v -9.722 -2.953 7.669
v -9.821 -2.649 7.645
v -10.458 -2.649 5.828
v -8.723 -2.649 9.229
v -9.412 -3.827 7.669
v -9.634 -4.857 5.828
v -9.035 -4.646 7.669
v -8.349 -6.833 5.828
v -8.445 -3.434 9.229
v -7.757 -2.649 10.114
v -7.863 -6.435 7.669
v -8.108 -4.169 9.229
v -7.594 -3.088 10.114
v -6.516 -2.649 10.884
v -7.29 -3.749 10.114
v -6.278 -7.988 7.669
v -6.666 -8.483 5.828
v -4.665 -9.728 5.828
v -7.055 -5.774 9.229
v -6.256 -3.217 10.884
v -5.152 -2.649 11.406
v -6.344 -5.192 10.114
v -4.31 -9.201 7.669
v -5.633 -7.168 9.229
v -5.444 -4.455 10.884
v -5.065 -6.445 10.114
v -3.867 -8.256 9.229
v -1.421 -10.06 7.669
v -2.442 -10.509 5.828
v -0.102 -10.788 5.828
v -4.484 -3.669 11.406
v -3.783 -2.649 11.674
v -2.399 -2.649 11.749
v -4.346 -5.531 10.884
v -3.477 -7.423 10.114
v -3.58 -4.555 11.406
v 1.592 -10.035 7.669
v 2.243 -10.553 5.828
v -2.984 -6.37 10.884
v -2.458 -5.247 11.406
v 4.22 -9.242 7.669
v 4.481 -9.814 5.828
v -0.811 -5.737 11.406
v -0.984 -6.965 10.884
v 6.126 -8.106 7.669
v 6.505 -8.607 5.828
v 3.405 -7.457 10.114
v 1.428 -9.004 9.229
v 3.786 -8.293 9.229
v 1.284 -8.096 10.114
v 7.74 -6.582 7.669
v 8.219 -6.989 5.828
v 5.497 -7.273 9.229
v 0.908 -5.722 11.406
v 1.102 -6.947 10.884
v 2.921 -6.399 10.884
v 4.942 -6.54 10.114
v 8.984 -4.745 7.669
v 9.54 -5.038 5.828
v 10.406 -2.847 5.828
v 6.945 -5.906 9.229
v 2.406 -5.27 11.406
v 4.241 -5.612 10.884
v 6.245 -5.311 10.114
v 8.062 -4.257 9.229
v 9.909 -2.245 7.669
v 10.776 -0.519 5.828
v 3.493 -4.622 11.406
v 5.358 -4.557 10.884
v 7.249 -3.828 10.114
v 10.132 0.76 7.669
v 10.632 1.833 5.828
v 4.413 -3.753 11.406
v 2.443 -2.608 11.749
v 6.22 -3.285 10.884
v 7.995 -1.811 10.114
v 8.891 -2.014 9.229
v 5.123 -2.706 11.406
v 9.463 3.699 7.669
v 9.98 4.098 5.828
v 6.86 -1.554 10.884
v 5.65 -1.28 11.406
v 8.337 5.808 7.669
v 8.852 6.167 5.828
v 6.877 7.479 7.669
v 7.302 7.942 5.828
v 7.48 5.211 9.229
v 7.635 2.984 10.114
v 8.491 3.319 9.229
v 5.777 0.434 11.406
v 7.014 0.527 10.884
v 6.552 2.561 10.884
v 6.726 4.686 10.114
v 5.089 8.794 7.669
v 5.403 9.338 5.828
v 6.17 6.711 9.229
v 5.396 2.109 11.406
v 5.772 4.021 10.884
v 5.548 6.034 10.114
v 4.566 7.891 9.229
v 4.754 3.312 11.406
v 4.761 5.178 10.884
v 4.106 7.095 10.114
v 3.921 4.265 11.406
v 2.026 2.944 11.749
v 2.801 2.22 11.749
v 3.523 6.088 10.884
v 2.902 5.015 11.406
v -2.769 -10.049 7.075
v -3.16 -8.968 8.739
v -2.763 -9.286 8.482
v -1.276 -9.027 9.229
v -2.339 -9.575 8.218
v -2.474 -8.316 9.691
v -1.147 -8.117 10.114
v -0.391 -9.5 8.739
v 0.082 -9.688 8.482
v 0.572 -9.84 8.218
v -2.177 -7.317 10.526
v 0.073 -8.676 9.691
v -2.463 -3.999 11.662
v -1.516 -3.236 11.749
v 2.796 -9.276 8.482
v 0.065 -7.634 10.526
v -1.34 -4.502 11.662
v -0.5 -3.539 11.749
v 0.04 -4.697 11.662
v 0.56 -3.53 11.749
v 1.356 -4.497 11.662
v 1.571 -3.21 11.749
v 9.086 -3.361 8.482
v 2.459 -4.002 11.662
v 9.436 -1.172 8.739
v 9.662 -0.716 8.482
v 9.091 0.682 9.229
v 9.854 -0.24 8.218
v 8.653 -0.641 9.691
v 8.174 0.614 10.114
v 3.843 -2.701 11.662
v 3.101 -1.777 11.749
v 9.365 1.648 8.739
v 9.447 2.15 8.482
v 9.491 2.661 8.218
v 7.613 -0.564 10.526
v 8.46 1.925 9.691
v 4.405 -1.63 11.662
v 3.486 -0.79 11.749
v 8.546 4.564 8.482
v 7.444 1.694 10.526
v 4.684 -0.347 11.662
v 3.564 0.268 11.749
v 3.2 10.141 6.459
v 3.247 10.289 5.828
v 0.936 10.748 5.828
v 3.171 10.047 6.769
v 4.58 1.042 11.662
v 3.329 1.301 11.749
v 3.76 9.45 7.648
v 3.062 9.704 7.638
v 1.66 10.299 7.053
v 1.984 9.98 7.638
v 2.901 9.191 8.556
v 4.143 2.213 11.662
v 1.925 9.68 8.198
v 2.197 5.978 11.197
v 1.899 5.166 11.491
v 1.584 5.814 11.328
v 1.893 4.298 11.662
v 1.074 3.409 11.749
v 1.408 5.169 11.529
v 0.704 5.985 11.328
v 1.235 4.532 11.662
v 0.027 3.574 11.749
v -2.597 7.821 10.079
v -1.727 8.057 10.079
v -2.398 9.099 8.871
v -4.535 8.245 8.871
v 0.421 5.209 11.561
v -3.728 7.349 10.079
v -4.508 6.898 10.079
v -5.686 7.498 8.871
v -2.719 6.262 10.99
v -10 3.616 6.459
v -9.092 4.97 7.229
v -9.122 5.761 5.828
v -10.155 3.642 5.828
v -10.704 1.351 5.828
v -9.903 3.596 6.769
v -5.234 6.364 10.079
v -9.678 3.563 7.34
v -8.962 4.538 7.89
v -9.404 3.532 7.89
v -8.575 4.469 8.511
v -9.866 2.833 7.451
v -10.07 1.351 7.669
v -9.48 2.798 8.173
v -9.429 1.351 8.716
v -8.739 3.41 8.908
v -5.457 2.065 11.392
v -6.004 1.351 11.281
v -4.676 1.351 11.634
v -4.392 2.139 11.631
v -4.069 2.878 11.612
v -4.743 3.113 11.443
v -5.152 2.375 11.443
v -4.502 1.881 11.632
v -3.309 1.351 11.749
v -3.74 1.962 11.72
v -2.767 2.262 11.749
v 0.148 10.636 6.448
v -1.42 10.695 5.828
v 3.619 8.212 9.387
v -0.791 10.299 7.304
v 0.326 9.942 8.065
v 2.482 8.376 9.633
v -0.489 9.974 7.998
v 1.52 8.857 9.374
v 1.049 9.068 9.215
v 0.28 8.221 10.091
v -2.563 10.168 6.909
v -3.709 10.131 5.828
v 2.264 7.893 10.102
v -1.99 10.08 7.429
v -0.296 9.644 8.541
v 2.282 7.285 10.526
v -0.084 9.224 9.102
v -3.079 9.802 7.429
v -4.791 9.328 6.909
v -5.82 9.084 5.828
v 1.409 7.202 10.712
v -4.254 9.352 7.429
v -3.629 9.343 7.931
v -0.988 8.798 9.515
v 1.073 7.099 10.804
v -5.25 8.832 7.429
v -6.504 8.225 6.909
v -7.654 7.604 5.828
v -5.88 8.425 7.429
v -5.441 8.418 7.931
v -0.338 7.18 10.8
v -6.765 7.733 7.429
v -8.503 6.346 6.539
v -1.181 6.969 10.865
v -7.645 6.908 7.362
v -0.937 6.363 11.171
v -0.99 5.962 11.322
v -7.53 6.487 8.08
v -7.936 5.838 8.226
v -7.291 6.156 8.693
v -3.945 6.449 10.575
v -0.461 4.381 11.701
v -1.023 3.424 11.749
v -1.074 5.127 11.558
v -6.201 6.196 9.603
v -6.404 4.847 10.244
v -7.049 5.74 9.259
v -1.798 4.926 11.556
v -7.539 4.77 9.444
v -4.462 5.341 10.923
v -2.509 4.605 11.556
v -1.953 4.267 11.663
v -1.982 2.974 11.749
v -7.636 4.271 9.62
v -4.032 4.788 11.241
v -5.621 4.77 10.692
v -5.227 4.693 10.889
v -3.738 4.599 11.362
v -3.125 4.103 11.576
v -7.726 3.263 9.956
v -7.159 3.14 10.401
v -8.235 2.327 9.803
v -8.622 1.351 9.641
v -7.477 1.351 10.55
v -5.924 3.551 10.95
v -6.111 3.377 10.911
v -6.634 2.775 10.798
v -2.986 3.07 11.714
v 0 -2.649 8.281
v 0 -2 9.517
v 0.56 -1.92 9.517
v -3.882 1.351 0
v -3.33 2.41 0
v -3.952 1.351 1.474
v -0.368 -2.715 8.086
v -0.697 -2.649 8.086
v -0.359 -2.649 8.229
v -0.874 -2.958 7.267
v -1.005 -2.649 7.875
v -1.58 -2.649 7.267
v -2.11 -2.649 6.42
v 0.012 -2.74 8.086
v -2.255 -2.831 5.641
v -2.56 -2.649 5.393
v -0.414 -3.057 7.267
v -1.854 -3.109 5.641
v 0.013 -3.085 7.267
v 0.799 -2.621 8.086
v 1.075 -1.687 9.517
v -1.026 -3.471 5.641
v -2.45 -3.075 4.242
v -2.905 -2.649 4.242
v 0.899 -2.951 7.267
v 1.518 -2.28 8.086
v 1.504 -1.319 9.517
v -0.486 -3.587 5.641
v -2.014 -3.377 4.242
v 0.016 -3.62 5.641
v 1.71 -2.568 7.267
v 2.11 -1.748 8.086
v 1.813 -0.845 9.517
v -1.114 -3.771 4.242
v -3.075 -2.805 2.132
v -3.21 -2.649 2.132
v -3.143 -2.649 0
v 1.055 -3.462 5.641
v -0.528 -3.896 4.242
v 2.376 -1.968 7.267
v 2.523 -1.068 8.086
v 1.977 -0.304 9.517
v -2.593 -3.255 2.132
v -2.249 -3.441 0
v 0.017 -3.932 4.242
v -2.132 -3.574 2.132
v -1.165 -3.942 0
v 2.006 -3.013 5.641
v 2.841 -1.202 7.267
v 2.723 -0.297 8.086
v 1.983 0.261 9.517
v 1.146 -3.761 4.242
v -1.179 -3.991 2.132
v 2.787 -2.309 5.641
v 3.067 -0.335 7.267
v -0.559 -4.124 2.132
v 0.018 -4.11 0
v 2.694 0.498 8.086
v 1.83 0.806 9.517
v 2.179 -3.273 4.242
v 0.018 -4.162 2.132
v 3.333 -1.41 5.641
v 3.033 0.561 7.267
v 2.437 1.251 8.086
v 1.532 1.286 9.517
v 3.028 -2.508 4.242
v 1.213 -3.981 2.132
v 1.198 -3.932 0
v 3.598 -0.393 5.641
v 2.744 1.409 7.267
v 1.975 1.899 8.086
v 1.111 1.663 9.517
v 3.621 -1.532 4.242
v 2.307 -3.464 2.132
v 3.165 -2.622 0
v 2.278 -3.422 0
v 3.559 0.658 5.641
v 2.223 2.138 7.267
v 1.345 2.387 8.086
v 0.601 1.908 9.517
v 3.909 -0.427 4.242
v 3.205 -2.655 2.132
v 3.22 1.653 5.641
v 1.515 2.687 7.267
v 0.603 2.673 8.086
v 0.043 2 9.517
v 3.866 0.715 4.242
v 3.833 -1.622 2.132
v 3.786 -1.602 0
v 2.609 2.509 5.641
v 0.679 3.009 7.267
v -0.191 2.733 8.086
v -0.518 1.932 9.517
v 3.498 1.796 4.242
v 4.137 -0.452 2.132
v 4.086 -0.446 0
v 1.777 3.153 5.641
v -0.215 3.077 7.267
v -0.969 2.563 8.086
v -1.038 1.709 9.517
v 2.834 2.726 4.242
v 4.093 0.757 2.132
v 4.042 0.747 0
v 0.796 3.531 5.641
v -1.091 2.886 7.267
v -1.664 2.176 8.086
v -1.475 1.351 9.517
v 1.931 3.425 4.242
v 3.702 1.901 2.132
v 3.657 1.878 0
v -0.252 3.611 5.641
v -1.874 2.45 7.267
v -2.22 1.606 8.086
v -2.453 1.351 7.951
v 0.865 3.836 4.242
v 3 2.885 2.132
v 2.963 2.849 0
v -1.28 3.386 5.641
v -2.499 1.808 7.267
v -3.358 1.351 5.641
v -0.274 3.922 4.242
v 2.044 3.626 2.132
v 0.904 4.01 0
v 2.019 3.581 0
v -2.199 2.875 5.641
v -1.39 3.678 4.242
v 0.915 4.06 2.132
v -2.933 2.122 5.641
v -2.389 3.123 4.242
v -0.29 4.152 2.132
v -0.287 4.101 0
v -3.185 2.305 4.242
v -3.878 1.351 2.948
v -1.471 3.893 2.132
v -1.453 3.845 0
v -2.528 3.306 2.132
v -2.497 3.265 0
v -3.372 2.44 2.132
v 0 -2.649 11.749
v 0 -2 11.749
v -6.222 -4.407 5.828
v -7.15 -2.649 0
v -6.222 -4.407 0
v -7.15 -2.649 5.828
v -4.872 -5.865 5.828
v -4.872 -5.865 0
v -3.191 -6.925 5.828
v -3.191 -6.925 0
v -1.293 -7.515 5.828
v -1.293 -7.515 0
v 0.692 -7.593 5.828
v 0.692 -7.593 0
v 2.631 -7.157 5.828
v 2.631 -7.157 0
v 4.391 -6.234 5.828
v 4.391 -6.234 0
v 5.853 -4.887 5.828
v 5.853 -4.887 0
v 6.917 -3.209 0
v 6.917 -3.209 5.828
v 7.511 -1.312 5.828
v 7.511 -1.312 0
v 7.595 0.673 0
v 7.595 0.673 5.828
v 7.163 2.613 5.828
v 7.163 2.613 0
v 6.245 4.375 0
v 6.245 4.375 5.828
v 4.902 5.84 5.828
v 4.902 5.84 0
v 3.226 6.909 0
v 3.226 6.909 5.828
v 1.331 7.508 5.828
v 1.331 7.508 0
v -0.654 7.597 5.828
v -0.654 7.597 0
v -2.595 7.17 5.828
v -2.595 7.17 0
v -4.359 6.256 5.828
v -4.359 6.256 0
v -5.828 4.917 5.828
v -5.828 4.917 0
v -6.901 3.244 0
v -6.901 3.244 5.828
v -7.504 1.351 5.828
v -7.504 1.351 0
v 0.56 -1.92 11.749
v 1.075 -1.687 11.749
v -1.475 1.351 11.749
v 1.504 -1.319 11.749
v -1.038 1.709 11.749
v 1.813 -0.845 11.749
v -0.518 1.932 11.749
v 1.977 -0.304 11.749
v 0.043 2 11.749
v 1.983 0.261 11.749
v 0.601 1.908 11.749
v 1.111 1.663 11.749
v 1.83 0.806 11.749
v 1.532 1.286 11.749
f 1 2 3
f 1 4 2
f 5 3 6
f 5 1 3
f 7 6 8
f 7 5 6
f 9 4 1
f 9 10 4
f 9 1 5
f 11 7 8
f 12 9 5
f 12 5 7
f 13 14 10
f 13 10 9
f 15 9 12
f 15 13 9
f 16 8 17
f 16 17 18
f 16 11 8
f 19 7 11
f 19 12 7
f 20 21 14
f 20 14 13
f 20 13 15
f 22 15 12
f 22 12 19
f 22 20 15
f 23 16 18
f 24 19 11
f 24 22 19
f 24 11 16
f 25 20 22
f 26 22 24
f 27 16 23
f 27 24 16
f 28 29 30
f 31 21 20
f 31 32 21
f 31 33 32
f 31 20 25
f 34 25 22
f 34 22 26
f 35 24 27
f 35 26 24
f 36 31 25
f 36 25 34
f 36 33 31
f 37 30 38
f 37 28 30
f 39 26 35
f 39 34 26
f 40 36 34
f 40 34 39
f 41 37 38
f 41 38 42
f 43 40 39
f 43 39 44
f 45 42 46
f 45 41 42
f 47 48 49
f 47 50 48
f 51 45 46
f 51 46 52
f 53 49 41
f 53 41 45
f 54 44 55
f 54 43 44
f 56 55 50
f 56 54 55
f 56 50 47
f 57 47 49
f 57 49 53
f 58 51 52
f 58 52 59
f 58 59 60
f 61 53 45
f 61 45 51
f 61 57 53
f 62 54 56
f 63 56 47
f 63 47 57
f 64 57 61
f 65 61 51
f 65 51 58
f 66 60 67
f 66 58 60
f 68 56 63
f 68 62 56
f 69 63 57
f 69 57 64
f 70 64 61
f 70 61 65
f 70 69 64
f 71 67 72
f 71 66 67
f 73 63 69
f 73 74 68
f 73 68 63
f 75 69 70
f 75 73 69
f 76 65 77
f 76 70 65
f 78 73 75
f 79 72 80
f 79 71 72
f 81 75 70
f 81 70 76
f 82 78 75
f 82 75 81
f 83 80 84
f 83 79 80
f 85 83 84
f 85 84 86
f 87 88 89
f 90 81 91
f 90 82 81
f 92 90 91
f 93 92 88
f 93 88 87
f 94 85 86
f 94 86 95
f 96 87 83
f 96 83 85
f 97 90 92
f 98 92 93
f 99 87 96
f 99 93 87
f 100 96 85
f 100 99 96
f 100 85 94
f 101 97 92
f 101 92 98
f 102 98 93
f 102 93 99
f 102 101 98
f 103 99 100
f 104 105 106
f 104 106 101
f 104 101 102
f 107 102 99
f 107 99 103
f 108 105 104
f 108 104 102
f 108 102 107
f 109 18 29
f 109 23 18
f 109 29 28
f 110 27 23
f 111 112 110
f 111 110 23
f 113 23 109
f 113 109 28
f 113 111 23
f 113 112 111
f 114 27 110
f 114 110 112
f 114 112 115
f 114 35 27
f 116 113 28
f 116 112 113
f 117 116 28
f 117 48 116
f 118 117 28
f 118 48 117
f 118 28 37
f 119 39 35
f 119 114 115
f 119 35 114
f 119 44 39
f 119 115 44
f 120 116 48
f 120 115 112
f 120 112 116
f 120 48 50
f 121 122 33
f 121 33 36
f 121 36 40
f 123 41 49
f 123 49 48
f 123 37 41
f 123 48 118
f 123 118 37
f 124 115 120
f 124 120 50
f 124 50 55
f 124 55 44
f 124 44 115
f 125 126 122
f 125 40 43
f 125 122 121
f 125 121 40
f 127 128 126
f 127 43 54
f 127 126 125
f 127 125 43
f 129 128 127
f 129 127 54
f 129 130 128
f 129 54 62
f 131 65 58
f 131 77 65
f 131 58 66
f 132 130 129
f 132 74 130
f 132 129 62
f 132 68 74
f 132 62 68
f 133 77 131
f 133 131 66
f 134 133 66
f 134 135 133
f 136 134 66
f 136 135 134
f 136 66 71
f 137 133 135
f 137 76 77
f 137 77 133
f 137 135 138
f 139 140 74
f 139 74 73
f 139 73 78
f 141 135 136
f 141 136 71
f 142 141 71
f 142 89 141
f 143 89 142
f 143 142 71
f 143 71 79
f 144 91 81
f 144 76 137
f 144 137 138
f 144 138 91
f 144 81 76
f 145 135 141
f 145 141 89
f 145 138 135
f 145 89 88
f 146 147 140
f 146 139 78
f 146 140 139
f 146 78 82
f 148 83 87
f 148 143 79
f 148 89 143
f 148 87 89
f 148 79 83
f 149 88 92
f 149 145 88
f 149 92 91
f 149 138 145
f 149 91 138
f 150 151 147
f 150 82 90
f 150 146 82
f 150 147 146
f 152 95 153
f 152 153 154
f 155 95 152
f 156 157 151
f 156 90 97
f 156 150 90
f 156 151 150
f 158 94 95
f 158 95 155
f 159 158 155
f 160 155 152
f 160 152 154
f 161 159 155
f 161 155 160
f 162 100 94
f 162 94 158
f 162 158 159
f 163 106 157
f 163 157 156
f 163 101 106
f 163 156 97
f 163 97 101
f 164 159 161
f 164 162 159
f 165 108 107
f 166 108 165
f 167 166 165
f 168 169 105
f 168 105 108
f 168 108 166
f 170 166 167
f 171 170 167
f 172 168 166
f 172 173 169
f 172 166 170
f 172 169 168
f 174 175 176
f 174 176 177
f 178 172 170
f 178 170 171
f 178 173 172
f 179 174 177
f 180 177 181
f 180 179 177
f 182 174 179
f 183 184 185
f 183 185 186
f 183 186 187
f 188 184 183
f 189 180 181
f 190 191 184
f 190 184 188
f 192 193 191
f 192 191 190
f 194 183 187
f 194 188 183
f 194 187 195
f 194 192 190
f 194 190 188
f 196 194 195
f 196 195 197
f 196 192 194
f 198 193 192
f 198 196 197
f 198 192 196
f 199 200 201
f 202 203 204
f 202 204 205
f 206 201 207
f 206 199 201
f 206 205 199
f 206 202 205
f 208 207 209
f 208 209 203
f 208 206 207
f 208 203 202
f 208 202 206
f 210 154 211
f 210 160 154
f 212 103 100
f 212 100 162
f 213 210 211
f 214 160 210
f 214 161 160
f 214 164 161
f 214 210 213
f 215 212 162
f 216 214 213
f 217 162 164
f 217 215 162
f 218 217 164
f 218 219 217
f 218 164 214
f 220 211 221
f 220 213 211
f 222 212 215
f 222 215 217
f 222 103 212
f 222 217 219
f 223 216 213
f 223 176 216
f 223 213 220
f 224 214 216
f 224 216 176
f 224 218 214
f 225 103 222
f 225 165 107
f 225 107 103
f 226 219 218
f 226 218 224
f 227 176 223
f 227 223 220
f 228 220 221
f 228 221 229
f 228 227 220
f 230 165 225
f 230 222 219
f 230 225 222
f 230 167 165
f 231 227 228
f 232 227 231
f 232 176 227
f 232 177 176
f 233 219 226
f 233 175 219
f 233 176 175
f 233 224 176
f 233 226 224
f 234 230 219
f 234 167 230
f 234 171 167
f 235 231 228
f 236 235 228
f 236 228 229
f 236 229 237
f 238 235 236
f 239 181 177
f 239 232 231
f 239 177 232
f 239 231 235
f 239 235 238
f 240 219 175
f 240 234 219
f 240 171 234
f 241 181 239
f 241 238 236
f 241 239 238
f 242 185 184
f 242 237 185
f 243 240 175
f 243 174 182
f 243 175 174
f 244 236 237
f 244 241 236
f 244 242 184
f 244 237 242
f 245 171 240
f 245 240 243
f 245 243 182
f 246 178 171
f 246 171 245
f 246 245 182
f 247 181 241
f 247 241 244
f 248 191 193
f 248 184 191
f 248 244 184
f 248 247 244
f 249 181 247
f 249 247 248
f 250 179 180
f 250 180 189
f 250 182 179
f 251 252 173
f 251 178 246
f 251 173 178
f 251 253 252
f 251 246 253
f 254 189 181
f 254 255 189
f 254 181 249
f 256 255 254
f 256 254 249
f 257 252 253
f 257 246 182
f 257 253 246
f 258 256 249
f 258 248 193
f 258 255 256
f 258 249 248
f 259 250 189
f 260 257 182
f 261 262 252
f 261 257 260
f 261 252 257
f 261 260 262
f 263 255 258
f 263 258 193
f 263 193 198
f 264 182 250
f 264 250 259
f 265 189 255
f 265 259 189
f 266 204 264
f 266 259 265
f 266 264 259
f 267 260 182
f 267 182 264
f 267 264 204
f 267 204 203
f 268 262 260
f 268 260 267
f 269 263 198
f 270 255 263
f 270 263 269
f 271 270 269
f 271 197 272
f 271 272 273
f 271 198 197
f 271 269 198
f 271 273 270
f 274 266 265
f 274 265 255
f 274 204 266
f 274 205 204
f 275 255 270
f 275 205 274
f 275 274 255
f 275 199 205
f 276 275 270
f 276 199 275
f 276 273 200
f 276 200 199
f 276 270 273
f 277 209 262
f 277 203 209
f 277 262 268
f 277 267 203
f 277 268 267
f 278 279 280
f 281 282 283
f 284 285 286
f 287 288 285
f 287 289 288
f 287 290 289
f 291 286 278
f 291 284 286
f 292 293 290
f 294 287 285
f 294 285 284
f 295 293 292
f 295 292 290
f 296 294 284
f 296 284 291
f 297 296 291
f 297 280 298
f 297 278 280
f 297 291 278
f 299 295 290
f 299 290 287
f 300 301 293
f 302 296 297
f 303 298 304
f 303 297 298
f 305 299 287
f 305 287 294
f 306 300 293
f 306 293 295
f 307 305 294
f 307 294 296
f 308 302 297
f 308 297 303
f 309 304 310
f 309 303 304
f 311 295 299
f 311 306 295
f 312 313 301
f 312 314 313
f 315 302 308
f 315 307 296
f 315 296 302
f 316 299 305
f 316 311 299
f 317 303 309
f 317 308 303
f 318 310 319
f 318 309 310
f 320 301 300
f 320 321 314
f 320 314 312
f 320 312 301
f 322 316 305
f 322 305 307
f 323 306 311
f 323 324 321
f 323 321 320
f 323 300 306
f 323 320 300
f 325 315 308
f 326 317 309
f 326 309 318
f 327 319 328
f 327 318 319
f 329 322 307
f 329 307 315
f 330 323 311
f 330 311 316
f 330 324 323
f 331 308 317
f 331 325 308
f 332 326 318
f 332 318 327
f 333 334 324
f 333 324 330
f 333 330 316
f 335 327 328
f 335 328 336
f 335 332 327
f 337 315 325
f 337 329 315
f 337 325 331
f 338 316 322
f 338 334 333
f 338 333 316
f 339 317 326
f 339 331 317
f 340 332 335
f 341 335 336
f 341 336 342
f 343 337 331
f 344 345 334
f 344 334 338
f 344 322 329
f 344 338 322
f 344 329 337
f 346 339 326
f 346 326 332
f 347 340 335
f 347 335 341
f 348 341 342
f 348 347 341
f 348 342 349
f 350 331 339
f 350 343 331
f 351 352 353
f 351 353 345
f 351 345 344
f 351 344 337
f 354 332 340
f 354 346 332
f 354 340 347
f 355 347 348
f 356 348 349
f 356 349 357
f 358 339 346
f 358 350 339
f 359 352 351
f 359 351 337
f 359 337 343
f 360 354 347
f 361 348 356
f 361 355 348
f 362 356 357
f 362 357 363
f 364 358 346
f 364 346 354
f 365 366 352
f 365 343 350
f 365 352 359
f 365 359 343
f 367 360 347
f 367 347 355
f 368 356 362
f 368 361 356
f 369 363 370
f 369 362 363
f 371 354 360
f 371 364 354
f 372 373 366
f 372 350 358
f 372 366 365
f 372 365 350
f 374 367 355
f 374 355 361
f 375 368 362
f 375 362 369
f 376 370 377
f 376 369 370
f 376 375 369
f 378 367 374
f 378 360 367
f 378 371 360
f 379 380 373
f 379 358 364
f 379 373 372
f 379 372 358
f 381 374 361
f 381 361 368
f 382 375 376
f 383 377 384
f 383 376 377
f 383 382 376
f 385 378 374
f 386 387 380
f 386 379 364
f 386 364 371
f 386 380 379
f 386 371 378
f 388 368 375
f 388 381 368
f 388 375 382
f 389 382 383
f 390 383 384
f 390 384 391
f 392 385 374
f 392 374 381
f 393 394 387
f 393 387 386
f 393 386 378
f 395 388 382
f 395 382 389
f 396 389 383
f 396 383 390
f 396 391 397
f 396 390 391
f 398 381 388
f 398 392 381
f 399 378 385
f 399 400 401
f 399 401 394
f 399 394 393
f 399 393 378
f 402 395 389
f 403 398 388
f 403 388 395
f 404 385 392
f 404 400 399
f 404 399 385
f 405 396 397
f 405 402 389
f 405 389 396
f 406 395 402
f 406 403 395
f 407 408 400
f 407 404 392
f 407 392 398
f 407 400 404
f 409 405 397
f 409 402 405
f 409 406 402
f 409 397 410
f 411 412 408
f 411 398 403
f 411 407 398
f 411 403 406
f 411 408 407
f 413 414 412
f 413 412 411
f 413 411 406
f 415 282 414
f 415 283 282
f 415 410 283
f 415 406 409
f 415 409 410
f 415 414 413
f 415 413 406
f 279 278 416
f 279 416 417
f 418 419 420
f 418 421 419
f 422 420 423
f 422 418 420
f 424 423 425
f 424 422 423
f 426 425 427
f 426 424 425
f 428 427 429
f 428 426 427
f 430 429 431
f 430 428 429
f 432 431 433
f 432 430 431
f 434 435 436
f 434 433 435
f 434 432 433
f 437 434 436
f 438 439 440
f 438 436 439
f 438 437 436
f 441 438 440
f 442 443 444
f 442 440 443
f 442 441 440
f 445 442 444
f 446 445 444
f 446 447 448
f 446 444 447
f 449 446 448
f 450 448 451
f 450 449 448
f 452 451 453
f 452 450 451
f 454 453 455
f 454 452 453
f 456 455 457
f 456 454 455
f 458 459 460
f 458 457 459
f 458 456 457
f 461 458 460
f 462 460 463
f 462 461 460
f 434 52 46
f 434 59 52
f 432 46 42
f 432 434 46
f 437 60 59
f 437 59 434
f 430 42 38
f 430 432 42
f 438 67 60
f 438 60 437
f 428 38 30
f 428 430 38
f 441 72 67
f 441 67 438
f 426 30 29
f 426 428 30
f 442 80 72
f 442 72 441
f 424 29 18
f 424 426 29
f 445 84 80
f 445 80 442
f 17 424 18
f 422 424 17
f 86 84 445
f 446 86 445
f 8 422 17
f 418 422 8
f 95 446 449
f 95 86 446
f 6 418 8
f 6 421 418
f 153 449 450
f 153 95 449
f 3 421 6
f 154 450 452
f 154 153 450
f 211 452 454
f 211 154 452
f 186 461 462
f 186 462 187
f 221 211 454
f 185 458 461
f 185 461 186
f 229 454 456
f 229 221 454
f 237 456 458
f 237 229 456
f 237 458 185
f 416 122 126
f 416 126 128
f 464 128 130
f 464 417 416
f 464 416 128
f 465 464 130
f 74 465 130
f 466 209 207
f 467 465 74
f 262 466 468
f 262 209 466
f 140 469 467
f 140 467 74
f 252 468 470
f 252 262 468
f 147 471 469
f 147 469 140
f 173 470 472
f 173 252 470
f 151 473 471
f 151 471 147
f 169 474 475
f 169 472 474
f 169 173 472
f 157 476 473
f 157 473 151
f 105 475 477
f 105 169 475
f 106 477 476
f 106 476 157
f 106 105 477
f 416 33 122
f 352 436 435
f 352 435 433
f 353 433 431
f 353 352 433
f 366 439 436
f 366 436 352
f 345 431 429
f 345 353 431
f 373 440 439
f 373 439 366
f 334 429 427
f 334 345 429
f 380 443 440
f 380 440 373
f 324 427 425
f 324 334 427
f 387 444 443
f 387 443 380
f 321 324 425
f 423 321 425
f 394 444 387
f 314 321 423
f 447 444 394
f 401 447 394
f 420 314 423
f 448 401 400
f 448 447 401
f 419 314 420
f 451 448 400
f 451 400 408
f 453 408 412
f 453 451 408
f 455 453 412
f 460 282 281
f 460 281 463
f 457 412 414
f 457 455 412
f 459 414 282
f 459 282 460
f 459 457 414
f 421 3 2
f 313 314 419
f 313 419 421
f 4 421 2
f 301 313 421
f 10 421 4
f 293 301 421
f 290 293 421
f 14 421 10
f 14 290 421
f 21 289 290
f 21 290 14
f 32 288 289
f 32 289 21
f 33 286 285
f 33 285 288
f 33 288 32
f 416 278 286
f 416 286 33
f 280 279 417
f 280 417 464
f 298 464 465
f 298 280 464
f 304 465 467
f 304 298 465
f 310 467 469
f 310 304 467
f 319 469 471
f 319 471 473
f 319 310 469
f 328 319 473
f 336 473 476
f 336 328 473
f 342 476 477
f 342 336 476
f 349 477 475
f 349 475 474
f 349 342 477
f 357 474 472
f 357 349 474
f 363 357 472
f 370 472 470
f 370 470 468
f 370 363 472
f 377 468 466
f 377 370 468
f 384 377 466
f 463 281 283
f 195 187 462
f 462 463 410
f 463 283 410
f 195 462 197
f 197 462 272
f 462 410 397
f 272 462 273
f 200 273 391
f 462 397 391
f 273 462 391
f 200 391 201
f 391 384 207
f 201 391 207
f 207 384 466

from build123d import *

# Parameters (mm, degrees)
F3_W     = 4
F3_H     = 13.1636379468
F4_DEPTH = 10.7897276517


with BuildPart() as f2:
    # F1 (on Front) → F2 (revolve)
    with BuildSketch(Plane.XZ):
        with BuildLine():
            ThreePointArc((2, 9.5173232257), (3.7962324027, 4.9229765601), (4.1105155833, 0))
            Line((4.1105155833, 0), (6.425, 0))
            Line((6.425, 0), (7.625, 0))
            Line((7.625, 0), (7.625, 5.8279288933))
            Line((7.625, 5.8279288933), (10.7887275517, 5.8279288933))
            ThreePointArc((10.7887275517, 5.8279288933), (8.2404077135, 10.0788924102), (3.5738223232, 11.7485048249))
            Line((3.5738223232, 11.7485048249), (2, 11.7485048249))
            Line((2, 11.7485048249), (2, 9.5173232257))
        make_face()
    revolve(axis=Axis((0, 0, 0), (0, 0, 1)))

    # F3 (on Right) → F4 (cut, through all)
    with BuildSketch(Plane.YZ):
        with Locations((-0.6494129193, 5.3884481313)):
            Rectangle(F3_W, F3_H)
    extrude(amount=-F4_DEPTH, mode=Mode.SUBTRACT)


solid = f2.part
